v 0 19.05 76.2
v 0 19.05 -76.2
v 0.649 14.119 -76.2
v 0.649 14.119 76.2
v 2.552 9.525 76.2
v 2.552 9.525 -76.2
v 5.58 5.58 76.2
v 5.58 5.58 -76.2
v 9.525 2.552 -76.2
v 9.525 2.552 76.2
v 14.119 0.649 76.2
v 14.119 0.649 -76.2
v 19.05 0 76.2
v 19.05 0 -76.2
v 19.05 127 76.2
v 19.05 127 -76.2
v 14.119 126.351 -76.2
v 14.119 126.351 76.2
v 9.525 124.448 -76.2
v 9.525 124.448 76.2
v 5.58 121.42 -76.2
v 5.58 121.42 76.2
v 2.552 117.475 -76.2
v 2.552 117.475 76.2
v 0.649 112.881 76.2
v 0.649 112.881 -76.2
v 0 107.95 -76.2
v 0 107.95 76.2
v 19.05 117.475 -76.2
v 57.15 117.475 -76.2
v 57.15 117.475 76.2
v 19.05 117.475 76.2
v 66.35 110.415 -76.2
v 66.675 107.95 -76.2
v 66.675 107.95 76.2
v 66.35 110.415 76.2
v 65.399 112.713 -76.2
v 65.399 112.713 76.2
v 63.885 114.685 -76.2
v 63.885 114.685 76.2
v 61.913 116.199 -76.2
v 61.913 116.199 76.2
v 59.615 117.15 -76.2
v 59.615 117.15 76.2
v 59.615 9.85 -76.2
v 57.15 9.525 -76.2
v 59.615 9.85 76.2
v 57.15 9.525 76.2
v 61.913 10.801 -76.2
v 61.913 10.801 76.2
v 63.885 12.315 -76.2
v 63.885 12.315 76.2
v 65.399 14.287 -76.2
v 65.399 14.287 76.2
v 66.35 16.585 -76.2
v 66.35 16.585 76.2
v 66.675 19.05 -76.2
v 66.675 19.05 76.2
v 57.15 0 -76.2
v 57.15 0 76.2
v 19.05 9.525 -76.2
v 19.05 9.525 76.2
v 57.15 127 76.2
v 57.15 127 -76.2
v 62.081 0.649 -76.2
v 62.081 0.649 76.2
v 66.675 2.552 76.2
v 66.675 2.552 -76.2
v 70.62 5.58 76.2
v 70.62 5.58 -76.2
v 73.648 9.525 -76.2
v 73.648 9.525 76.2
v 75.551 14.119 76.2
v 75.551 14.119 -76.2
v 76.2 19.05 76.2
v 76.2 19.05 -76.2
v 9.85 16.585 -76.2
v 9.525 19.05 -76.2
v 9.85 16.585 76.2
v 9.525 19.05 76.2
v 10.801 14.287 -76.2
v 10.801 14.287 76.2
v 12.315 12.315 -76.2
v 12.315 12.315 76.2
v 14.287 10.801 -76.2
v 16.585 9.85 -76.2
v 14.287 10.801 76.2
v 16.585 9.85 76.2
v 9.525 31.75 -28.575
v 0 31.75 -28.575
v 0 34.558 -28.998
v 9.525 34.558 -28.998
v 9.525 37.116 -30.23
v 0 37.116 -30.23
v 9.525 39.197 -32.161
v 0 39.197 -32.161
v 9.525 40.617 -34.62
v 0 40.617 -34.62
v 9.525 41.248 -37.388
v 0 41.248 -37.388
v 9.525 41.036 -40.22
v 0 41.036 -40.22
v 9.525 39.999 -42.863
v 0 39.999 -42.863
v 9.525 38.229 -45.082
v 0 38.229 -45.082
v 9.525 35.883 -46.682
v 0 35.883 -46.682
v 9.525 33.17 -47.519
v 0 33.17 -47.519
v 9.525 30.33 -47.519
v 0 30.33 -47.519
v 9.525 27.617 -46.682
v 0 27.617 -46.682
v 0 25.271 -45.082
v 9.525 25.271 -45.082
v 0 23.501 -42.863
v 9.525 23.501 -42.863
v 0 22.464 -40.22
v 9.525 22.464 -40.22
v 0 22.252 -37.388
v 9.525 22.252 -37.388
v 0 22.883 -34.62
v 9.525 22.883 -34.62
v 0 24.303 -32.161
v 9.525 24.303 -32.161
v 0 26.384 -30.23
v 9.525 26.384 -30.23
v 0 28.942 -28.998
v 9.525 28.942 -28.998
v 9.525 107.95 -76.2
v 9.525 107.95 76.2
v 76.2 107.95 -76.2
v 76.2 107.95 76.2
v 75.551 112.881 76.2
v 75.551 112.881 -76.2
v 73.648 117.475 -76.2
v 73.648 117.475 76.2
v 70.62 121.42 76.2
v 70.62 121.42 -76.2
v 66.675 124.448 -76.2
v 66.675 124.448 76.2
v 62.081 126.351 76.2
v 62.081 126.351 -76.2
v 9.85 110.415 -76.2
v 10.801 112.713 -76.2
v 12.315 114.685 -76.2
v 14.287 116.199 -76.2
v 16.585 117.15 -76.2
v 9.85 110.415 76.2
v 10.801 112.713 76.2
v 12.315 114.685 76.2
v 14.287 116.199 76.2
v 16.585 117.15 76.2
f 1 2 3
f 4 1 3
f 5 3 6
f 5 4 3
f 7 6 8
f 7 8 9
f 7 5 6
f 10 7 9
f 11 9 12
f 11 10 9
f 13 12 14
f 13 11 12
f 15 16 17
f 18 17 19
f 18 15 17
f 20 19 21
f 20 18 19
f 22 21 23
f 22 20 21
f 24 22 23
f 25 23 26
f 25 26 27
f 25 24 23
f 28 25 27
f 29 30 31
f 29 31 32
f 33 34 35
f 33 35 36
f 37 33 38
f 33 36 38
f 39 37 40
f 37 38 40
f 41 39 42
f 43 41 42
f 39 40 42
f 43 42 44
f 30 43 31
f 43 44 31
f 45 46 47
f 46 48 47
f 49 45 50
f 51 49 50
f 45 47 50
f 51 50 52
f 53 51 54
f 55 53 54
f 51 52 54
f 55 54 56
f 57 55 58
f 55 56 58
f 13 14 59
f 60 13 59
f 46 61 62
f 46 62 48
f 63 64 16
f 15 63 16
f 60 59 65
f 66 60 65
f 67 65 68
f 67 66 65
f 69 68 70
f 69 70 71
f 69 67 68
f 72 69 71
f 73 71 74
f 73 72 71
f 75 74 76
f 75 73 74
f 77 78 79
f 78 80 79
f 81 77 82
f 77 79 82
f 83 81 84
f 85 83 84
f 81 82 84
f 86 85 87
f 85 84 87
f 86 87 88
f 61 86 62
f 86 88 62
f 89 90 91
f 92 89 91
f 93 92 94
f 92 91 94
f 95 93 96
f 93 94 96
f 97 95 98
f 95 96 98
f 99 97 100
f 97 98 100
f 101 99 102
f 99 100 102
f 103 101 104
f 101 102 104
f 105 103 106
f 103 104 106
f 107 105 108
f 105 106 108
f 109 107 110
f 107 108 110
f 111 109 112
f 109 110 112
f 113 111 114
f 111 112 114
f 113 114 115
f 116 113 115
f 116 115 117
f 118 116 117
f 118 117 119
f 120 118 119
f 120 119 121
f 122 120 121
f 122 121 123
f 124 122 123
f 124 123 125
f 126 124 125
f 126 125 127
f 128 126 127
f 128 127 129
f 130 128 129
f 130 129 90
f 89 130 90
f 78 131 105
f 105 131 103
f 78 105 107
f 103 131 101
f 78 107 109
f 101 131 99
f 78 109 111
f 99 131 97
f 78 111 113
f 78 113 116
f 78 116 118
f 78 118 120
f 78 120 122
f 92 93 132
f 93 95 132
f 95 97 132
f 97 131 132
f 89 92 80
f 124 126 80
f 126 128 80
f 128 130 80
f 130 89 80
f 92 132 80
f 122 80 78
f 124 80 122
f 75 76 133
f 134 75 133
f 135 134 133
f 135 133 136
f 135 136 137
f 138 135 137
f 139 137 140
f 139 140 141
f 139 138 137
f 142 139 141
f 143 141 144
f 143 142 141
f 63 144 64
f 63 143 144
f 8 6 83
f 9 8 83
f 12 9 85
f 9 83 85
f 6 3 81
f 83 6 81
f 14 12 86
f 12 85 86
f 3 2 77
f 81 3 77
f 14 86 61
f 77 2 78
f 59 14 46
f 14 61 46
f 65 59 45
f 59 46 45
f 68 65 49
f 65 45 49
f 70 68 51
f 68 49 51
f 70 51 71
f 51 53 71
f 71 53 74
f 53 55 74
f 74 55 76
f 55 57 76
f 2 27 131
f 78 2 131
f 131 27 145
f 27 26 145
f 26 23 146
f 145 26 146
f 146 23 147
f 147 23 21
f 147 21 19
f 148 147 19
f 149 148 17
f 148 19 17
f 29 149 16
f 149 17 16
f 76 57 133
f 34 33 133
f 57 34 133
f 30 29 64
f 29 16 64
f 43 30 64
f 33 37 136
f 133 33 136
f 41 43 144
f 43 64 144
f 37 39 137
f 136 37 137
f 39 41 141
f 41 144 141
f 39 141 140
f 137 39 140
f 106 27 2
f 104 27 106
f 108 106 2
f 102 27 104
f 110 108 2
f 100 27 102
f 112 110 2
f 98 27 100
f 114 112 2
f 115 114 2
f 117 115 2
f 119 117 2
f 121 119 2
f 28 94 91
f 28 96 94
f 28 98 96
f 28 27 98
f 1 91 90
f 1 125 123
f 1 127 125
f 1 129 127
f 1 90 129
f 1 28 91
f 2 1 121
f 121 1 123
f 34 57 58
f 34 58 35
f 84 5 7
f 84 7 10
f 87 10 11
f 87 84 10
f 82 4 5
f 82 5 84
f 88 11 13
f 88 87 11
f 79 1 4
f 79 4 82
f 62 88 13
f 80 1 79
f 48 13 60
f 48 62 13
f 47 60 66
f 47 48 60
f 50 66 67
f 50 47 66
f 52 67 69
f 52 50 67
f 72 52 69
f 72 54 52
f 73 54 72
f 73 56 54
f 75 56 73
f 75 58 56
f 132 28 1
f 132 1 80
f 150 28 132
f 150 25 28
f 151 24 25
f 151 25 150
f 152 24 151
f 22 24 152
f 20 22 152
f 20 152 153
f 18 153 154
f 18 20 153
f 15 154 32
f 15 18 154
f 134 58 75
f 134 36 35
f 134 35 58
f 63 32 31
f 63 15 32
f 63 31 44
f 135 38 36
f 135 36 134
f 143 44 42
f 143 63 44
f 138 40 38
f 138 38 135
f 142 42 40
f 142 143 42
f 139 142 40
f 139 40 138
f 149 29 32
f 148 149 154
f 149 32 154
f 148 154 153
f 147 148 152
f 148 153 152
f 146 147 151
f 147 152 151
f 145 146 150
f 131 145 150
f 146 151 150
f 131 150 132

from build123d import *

# Parameters (mm, degrees)
BASETUBER_DEPTH    = 76.2
CUT_EXTRUDE1_REACH = 78.2
SKETCH2_R          = 9.525


with BuildPart() as part:
    # Sketch1 → BaseTubeR (new body, symmetric)
    with BuildSketch(Plane.XY):
        with BuildLine():
            Line((19.05, 0), (57.15, 0))
            ThreePointArc((57.15, 0), (70.620384182, 5.579615818), (76.2, 19.05))
            Line((76.2, 19.05), (76.2, 107.95))
            ThreePointArc((76.2, 107.95), (70.620384182, 121.420384182), (57.15, 127))
            Line((57.15, 127), (19.05, 127))
            ThreePointArc((19.05, 127), (5.579615818, 121.420384182), (0, 107.95))
            Line((0, 107.95), (0, 19.05))
            ThreePointArc((0, 19.05), (5.579615818, 5.579615818), (19.05, 0))
        make_face()
        with BuildLine():
            Line((19.05, 9.525), (57.15, 9.525))
            ThreePointArc((57.15, 9.525), (63.885192091, 12.314807909), (66.675, 19.05))
            Line((66.675, 19.05), (66.675, 107.95))
            ThreePointArc((66.675, 107.95), (63.885192091, 114.685192091), (57.15, 117.475))
            Line((57.15, 117.475), (19.05, 117.475))
            ThreePointArc((19.05, 117.475), (12.314807909, 114.685192091), (9.525, 107.95))
            Line((9.525, 107.95), (9.525, 19.05))
            ThreePointArc((9.525, 19.05), (12.314807909, 12.314807909), (19.05, 9.525))
        make_face(mode=Mode.SUBTRACT)
    extrude(amount=BASETUBER_DEPTH, both=True)

    # Sketch2 → Cut-Extrude1 (cut, up to next)
    with BuildSketch(Plane.ZY, mode=Mode.PRIVATE) as cut_extrude1_sk1:
        with Locations((-38.1, 31.75)):
            Circle(SKETCH2_R)
    cut_extrude1_tool1 = extrude(cut_extrude1_sk1.sketch, amount=-CUT_EXTRUDE1_REACH, mode=Mode.PRIVATE) & part.part
    add(cut_extrude1_tool1.solids().sort_by_distance((0, 31.75, -38.1))[0], mode=Mode.SUBTRACT)


solid = part.part
